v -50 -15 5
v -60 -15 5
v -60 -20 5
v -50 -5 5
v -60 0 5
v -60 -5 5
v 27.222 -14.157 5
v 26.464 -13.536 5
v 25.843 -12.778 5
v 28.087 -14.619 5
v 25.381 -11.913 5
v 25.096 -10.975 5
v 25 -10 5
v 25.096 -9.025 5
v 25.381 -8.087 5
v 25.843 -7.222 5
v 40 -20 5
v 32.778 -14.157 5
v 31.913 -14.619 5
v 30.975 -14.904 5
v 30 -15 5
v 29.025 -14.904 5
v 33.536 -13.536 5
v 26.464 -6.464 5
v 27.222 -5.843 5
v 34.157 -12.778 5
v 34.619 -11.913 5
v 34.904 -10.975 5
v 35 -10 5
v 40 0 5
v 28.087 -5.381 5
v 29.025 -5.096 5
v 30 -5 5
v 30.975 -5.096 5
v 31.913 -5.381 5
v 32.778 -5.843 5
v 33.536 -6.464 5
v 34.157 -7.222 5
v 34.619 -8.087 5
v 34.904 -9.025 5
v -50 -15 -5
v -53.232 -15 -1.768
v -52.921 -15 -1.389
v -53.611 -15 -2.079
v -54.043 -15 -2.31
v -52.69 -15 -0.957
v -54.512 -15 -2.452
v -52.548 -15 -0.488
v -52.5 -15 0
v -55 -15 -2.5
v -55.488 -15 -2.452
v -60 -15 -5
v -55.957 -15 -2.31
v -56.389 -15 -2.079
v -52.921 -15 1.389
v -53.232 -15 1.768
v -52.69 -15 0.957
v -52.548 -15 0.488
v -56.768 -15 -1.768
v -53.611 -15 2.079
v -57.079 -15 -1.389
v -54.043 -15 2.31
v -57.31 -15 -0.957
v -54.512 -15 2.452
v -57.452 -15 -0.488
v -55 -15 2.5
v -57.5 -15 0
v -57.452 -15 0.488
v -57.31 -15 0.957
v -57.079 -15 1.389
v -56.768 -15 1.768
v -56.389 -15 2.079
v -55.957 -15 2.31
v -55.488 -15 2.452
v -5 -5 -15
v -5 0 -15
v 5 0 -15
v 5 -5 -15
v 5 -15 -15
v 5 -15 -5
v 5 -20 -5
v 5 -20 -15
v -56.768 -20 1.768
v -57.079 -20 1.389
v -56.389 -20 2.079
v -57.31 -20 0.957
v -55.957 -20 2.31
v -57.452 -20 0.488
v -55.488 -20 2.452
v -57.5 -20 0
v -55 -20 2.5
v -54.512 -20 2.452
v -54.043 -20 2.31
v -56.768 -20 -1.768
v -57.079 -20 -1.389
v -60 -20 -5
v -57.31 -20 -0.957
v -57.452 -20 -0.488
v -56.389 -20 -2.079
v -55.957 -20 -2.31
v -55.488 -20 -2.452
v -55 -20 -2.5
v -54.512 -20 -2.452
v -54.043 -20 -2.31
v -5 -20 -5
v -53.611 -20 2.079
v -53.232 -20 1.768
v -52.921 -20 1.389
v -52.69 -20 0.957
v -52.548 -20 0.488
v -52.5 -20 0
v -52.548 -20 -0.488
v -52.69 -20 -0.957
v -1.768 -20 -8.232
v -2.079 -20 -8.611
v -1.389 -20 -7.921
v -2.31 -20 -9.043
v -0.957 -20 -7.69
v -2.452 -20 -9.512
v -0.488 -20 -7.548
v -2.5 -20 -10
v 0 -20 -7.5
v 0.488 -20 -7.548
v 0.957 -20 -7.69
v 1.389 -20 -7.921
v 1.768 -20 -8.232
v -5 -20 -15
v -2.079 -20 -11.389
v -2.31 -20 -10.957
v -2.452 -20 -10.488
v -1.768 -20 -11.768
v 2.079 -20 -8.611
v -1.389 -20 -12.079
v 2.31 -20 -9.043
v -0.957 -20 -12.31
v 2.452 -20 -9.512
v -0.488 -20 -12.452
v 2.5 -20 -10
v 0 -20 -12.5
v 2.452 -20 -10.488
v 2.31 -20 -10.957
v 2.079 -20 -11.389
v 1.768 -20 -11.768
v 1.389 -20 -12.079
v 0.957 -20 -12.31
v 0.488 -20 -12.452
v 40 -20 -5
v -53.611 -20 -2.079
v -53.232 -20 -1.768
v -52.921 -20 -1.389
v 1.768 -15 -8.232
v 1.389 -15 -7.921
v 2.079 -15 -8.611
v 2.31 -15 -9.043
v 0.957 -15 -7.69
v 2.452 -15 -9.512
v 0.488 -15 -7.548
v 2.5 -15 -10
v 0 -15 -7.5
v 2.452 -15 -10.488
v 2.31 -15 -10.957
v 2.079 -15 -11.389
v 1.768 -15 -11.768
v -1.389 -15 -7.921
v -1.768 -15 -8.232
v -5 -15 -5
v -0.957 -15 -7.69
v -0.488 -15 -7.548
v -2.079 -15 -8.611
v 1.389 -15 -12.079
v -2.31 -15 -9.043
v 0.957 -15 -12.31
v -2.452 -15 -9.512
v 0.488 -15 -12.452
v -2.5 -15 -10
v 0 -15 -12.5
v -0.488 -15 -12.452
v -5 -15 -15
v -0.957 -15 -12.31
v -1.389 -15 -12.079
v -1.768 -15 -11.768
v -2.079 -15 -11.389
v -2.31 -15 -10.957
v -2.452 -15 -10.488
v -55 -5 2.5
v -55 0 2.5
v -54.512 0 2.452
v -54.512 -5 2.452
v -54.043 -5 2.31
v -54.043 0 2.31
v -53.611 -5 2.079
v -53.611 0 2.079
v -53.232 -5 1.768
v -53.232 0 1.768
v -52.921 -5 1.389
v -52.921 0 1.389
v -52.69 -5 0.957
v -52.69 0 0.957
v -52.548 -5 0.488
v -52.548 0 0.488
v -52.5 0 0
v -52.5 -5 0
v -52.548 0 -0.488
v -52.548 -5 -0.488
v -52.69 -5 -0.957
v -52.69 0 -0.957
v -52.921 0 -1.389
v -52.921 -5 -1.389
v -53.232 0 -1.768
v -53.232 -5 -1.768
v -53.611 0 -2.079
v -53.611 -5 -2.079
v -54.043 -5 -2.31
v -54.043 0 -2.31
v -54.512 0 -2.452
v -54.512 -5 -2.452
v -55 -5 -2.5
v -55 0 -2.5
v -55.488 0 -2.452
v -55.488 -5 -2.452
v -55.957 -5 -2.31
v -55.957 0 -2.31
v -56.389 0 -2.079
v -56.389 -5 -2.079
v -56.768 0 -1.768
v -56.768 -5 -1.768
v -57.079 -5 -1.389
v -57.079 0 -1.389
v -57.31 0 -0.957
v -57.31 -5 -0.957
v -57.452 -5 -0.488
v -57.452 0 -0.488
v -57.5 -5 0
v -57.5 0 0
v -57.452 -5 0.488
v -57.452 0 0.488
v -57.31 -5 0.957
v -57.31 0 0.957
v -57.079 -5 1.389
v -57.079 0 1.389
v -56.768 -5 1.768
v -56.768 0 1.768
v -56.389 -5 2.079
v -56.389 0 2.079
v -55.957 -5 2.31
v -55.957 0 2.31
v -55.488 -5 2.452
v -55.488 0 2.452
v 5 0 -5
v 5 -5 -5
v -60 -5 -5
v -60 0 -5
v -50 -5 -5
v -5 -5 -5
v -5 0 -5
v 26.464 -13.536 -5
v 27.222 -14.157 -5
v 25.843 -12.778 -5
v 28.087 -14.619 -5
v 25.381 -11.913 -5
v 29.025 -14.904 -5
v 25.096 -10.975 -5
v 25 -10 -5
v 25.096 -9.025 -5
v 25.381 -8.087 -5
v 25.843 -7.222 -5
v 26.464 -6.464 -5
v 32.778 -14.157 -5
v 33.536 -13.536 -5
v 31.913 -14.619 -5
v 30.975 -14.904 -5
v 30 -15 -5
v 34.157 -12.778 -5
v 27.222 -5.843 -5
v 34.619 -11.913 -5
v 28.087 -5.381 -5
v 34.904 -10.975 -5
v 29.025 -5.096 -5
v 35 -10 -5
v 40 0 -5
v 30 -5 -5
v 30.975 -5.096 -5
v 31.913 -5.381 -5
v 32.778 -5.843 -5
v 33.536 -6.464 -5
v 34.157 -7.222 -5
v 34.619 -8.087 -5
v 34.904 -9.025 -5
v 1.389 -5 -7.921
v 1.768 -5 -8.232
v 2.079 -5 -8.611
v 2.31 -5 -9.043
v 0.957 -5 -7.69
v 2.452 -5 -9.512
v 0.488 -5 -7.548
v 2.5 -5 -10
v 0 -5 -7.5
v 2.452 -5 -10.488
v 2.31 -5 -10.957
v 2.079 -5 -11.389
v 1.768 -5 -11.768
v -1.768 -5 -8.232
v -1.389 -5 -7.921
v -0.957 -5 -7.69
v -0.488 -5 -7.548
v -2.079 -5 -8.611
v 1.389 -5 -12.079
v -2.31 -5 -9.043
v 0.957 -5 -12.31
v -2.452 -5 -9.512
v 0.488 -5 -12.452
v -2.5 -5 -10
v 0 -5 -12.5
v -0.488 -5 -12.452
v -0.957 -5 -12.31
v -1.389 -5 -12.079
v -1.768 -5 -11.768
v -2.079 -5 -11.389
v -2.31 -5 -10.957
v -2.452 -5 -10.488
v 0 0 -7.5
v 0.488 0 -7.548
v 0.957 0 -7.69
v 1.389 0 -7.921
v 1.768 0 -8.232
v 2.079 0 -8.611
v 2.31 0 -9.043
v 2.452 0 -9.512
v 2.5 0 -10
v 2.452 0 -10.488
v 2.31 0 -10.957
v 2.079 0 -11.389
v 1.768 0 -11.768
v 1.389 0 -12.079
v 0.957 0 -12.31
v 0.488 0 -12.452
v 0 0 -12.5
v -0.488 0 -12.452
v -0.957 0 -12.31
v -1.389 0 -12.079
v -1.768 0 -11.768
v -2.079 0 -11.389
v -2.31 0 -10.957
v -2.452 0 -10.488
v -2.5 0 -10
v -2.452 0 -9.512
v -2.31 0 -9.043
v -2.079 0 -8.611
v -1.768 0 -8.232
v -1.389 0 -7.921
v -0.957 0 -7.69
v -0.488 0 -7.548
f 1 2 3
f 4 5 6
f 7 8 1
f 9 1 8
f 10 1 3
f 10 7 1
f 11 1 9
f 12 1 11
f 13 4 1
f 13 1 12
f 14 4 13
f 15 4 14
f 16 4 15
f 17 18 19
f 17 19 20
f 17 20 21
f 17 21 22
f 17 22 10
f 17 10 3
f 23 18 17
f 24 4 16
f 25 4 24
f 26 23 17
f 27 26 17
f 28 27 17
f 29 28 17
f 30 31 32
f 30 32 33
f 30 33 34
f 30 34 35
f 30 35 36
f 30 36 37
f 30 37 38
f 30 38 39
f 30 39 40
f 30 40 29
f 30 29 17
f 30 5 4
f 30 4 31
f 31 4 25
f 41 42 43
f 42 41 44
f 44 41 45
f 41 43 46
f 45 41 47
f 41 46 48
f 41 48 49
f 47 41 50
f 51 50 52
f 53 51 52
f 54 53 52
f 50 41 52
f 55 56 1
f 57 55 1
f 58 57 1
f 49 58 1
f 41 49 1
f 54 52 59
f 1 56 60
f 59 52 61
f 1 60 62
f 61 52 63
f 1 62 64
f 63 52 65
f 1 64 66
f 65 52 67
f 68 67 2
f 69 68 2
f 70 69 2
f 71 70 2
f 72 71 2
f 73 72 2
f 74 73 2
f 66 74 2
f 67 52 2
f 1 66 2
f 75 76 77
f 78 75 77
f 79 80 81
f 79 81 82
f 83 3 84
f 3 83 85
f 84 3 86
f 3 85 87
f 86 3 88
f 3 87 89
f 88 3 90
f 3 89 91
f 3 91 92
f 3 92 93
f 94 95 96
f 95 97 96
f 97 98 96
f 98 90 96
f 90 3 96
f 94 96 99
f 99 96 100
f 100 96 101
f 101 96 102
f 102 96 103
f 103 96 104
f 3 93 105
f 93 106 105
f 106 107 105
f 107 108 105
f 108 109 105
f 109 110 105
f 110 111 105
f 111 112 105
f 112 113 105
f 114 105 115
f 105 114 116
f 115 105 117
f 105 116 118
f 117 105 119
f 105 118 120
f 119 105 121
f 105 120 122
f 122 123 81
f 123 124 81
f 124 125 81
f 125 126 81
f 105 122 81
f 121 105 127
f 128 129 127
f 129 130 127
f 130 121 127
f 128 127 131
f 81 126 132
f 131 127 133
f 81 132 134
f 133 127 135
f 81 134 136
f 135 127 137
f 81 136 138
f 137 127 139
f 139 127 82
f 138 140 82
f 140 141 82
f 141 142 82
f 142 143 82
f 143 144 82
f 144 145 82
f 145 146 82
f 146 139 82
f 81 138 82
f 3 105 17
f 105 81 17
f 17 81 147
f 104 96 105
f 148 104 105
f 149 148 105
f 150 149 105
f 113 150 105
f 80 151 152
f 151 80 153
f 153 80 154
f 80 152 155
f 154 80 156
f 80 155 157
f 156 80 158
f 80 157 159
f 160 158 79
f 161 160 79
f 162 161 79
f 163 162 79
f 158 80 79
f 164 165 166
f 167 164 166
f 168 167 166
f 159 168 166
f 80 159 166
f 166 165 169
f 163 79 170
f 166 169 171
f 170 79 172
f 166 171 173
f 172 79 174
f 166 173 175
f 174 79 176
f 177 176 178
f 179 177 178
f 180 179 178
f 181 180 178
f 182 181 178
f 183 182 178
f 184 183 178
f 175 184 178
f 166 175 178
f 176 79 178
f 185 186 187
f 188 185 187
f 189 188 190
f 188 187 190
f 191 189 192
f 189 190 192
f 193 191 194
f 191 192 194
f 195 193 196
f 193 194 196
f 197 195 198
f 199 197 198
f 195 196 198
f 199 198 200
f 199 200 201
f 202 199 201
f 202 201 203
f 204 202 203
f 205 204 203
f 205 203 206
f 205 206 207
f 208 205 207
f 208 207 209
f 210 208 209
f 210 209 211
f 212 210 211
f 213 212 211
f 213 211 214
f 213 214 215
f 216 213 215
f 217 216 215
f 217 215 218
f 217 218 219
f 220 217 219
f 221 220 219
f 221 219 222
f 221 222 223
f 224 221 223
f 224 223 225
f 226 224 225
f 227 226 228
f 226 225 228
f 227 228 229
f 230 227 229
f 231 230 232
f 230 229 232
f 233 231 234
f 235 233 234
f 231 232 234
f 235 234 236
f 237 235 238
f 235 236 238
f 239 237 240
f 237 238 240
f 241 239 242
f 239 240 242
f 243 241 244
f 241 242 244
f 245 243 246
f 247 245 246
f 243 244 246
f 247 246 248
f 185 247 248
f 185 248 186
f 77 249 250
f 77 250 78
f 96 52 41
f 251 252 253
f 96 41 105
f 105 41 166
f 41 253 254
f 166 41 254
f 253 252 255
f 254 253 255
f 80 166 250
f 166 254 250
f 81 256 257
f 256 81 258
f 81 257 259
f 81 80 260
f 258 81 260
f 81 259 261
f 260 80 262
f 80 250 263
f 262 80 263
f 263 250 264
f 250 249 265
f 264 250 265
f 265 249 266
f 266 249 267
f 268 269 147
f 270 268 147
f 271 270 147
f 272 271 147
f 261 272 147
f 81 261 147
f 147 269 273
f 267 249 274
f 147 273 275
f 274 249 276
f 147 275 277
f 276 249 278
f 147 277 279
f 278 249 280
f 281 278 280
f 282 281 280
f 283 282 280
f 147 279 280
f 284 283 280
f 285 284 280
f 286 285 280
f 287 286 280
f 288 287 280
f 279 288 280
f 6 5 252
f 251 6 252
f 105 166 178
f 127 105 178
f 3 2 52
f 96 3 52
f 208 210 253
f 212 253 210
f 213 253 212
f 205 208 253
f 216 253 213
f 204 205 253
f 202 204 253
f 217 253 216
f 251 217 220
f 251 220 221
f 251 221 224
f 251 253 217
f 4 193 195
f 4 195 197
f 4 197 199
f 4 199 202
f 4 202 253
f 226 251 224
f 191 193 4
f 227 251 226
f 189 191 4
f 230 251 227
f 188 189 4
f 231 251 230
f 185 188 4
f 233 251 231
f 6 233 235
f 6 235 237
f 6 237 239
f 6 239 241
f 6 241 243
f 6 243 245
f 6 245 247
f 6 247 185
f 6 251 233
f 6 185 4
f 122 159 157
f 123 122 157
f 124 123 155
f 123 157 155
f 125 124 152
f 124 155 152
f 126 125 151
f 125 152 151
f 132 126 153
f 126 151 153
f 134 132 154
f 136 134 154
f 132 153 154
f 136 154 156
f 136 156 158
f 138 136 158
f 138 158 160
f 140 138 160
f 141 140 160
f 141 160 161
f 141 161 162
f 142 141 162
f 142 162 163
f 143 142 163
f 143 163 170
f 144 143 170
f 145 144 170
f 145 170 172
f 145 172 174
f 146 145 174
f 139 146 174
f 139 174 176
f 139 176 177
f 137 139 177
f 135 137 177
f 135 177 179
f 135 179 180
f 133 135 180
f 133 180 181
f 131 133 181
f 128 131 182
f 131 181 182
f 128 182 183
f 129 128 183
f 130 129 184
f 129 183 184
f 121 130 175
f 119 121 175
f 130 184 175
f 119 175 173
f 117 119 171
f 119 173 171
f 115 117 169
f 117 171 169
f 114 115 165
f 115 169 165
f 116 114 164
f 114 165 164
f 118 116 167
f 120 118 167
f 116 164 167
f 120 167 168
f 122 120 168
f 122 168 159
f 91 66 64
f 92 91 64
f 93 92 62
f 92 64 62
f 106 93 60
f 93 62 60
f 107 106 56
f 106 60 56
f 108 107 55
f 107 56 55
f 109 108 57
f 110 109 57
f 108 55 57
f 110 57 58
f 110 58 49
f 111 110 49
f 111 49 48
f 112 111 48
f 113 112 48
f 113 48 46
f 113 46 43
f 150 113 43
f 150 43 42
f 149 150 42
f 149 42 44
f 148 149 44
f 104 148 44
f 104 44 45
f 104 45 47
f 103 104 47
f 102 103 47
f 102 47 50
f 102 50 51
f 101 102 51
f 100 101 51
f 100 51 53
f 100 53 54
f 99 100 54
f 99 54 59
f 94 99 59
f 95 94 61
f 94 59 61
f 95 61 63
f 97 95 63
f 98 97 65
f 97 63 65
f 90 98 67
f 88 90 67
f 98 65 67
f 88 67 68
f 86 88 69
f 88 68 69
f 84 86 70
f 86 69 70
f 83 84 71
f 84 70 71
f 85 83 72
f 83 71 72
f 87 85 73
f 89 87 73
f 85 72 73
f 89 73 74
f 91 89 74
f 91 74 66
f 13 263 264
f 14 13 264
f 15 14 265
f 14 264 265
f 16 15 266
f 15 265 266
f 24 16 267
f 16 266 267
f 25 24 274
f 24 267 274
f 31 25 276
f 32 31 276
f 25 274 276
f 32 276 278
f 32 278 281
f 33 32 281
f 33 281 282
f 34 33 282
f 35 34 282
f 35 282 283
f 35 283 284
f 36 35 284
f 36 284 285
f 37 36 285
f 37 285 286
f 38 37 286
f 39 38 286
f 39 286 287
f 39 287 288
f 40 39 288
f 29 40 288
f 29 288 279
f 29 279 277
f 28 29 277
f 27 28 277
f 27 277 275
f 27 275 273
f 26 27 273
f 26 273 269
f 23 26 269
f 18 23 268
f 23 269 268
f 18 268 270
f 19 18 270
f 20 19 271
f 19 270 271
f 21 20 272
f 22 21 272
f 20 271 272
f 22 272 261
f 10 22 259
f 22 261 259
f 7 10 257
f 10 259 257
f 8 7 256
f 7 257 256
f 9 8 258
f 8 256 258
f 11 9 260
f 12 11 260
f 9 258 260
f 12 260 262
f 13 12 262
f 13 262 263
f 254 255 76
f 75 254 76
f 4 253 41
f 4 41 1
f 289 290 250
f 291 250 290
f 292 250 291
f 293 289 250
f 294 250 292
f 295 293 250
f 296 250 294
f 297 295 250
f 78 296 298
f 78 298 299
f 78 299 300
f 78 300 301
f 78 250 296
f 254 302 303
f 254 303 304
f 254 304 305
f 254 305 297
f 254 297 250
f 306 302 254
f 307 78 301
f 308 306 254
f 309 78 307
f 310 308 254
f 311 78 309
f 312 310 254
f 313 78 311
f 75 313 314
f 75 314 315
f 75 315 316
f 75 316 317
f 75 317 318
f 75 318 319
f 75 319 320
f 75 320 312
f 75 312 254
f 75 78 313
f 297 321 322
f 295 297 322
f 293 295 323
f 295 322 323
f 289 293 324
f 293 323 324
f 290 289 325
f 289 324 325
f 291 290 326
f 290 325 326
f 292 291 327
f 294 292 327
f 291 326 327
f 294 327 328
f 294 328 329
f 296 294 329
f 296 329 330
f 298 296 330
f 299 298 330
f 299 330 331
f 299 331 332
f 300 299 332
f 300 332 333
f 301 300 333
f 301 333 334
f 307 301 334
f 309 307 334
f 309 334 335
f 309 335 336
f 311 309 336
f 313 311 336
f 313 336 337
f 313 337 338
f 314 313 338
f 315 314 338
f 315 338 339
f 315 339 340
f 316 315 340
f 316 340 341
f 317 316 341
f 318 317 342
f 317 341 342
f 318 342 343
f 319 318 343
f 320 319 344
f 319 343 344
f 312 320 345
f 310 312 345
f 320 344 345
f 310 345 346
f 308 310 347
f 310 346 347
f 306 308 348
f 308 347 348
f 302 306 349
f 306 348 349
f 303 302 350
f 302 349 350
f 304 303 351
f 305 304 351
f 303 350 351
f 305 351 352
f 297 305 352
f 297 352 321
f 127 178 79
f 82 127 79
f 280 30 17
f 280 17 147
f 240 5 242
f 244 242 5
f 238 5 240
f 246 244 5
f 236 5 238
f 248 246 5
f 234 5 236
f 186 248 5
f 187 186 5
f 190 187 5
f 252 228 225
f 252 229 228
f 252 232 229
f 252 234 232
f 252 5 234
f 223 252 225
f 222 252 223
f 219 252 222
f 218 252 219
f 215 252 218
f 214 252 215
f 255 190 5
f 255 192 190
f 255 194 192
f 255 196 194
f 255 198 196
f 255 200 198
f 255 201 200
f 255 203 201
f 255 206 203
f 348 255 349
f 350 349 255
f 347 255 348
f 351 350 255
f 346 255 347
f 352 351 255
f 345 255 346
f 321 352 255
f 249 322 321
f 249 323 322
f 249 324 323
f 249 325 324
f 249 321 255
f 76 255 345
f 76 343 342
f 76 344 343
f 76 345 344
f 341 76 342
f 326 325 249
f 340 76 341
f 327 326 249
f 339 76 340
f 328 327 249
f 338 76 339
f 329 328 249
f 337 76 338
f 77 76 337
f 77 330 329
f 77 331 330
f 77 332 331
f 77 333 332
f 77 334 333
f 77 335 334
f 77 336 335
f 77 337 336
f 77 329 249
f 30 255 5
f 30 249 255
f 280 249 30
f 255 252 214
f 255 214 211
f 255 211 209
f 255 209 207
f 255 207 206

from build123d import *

# Parameters (mm, degrees)
SKETCH1_W           = 100
SKETCH1_H           = 10
SKETCH1_R           = 2.5
SKETCH1_W_2         = 10
BOSS_EXTRUDE1_DEPTH = 20
SKETCH2_W           = 10
SKETCH2_H           = 10
CUT_EXTRUDE1_DEPTH  = 10
SKETCH5_W           = 10
SKETCH5_H           = 10
CUT_EXTRUDE4_DEPTH  = 10
CUT_EXTRUDE3_REACH  = 66.031
SKETCH4_R           = 5


with BuildPart() as part:
    # Sketch1 → Boss-Extrude1 (new body)
    # profile 1 of 2: a face of its own
    with BuildSketch(Plane(origin=(0, 0, 0), x_dir=(1, 0, 0), z_dir=(0, 1, 0))):
        with Locations((-10, 0)):
            Rectangle(SKETCH1_W, SKETCH1_H)
        with Locations(Location((-55, 0, 0), (0, 0, 270))):
            Circle(SKETCH1_R, mode=Mode.SUBTRACT)
    # profile 2 of 2: a face of its own
    with BuildSketch(Plane(origin=(0, 0, 0), x_dir=(1, 0, 0), z_dir=(0, 1, 0))):
        with Locations((0, 10)):
            Rectangle(SKETCH1_W_2, SKETCH1_H)
        with Locations(Location((0, 10, 0), (0, 0, 270))):
            Circle(SKETCH1_R, mode=Mode.SUBTRACT)
    extrude(amount=-BOSS_EXTRUDE1_DEPTH)

    # Sketch2 → Cut-Extrude1 (cut)
    with BuildSketch(Plane.ZY.offset(60)):
        with Locations((0, -10)):
            Rectangle(SKETCH2_W, SKETCH2_H)
    extrude(amount=-CUT_EXTRUDE1_DEPTH, mode=Mode.SUBTRACT)

    # Sketch5 → Cut-Extrude4 (cut)
    with BuildSketch(Plane(origin=(0, 0, -15), x_dir=(-1, 0, 0), z_dir=(0, 0, -1))):
        with Locations((0, -10)):
            Rectangle(SKETCH5_W, SKETCH5_H)
    extrude(amount=-CUT_EXTRUDE4_DEPTH, mode=Mode.SUBTRACT)

    # Sketch4 → Cut-Extrude3 (cut, up to next)
    with BuildSketch(Plane(origin=(0, 0, -5), x_dir=(-1, 0, 0), z_dir=(0, 0, -1)), mode=Mode.PRIVATE) as cut_extrude3_sk1:
        with Locations((-30, -10)):
            Circle(SKETCH4_R)
    cut_extrude3_tool1 = extrude(cut_extrude3_sk1.sketch, amount=-CUT_EXTRUDE3_REACH, mode=Mode.PRIVATE) & part.part
    add(cut_extrude3_tool1.solids().sort_by_distance((30, -10, -5))[0], mode=Mode.SUBTRACT)


solid = part.part
